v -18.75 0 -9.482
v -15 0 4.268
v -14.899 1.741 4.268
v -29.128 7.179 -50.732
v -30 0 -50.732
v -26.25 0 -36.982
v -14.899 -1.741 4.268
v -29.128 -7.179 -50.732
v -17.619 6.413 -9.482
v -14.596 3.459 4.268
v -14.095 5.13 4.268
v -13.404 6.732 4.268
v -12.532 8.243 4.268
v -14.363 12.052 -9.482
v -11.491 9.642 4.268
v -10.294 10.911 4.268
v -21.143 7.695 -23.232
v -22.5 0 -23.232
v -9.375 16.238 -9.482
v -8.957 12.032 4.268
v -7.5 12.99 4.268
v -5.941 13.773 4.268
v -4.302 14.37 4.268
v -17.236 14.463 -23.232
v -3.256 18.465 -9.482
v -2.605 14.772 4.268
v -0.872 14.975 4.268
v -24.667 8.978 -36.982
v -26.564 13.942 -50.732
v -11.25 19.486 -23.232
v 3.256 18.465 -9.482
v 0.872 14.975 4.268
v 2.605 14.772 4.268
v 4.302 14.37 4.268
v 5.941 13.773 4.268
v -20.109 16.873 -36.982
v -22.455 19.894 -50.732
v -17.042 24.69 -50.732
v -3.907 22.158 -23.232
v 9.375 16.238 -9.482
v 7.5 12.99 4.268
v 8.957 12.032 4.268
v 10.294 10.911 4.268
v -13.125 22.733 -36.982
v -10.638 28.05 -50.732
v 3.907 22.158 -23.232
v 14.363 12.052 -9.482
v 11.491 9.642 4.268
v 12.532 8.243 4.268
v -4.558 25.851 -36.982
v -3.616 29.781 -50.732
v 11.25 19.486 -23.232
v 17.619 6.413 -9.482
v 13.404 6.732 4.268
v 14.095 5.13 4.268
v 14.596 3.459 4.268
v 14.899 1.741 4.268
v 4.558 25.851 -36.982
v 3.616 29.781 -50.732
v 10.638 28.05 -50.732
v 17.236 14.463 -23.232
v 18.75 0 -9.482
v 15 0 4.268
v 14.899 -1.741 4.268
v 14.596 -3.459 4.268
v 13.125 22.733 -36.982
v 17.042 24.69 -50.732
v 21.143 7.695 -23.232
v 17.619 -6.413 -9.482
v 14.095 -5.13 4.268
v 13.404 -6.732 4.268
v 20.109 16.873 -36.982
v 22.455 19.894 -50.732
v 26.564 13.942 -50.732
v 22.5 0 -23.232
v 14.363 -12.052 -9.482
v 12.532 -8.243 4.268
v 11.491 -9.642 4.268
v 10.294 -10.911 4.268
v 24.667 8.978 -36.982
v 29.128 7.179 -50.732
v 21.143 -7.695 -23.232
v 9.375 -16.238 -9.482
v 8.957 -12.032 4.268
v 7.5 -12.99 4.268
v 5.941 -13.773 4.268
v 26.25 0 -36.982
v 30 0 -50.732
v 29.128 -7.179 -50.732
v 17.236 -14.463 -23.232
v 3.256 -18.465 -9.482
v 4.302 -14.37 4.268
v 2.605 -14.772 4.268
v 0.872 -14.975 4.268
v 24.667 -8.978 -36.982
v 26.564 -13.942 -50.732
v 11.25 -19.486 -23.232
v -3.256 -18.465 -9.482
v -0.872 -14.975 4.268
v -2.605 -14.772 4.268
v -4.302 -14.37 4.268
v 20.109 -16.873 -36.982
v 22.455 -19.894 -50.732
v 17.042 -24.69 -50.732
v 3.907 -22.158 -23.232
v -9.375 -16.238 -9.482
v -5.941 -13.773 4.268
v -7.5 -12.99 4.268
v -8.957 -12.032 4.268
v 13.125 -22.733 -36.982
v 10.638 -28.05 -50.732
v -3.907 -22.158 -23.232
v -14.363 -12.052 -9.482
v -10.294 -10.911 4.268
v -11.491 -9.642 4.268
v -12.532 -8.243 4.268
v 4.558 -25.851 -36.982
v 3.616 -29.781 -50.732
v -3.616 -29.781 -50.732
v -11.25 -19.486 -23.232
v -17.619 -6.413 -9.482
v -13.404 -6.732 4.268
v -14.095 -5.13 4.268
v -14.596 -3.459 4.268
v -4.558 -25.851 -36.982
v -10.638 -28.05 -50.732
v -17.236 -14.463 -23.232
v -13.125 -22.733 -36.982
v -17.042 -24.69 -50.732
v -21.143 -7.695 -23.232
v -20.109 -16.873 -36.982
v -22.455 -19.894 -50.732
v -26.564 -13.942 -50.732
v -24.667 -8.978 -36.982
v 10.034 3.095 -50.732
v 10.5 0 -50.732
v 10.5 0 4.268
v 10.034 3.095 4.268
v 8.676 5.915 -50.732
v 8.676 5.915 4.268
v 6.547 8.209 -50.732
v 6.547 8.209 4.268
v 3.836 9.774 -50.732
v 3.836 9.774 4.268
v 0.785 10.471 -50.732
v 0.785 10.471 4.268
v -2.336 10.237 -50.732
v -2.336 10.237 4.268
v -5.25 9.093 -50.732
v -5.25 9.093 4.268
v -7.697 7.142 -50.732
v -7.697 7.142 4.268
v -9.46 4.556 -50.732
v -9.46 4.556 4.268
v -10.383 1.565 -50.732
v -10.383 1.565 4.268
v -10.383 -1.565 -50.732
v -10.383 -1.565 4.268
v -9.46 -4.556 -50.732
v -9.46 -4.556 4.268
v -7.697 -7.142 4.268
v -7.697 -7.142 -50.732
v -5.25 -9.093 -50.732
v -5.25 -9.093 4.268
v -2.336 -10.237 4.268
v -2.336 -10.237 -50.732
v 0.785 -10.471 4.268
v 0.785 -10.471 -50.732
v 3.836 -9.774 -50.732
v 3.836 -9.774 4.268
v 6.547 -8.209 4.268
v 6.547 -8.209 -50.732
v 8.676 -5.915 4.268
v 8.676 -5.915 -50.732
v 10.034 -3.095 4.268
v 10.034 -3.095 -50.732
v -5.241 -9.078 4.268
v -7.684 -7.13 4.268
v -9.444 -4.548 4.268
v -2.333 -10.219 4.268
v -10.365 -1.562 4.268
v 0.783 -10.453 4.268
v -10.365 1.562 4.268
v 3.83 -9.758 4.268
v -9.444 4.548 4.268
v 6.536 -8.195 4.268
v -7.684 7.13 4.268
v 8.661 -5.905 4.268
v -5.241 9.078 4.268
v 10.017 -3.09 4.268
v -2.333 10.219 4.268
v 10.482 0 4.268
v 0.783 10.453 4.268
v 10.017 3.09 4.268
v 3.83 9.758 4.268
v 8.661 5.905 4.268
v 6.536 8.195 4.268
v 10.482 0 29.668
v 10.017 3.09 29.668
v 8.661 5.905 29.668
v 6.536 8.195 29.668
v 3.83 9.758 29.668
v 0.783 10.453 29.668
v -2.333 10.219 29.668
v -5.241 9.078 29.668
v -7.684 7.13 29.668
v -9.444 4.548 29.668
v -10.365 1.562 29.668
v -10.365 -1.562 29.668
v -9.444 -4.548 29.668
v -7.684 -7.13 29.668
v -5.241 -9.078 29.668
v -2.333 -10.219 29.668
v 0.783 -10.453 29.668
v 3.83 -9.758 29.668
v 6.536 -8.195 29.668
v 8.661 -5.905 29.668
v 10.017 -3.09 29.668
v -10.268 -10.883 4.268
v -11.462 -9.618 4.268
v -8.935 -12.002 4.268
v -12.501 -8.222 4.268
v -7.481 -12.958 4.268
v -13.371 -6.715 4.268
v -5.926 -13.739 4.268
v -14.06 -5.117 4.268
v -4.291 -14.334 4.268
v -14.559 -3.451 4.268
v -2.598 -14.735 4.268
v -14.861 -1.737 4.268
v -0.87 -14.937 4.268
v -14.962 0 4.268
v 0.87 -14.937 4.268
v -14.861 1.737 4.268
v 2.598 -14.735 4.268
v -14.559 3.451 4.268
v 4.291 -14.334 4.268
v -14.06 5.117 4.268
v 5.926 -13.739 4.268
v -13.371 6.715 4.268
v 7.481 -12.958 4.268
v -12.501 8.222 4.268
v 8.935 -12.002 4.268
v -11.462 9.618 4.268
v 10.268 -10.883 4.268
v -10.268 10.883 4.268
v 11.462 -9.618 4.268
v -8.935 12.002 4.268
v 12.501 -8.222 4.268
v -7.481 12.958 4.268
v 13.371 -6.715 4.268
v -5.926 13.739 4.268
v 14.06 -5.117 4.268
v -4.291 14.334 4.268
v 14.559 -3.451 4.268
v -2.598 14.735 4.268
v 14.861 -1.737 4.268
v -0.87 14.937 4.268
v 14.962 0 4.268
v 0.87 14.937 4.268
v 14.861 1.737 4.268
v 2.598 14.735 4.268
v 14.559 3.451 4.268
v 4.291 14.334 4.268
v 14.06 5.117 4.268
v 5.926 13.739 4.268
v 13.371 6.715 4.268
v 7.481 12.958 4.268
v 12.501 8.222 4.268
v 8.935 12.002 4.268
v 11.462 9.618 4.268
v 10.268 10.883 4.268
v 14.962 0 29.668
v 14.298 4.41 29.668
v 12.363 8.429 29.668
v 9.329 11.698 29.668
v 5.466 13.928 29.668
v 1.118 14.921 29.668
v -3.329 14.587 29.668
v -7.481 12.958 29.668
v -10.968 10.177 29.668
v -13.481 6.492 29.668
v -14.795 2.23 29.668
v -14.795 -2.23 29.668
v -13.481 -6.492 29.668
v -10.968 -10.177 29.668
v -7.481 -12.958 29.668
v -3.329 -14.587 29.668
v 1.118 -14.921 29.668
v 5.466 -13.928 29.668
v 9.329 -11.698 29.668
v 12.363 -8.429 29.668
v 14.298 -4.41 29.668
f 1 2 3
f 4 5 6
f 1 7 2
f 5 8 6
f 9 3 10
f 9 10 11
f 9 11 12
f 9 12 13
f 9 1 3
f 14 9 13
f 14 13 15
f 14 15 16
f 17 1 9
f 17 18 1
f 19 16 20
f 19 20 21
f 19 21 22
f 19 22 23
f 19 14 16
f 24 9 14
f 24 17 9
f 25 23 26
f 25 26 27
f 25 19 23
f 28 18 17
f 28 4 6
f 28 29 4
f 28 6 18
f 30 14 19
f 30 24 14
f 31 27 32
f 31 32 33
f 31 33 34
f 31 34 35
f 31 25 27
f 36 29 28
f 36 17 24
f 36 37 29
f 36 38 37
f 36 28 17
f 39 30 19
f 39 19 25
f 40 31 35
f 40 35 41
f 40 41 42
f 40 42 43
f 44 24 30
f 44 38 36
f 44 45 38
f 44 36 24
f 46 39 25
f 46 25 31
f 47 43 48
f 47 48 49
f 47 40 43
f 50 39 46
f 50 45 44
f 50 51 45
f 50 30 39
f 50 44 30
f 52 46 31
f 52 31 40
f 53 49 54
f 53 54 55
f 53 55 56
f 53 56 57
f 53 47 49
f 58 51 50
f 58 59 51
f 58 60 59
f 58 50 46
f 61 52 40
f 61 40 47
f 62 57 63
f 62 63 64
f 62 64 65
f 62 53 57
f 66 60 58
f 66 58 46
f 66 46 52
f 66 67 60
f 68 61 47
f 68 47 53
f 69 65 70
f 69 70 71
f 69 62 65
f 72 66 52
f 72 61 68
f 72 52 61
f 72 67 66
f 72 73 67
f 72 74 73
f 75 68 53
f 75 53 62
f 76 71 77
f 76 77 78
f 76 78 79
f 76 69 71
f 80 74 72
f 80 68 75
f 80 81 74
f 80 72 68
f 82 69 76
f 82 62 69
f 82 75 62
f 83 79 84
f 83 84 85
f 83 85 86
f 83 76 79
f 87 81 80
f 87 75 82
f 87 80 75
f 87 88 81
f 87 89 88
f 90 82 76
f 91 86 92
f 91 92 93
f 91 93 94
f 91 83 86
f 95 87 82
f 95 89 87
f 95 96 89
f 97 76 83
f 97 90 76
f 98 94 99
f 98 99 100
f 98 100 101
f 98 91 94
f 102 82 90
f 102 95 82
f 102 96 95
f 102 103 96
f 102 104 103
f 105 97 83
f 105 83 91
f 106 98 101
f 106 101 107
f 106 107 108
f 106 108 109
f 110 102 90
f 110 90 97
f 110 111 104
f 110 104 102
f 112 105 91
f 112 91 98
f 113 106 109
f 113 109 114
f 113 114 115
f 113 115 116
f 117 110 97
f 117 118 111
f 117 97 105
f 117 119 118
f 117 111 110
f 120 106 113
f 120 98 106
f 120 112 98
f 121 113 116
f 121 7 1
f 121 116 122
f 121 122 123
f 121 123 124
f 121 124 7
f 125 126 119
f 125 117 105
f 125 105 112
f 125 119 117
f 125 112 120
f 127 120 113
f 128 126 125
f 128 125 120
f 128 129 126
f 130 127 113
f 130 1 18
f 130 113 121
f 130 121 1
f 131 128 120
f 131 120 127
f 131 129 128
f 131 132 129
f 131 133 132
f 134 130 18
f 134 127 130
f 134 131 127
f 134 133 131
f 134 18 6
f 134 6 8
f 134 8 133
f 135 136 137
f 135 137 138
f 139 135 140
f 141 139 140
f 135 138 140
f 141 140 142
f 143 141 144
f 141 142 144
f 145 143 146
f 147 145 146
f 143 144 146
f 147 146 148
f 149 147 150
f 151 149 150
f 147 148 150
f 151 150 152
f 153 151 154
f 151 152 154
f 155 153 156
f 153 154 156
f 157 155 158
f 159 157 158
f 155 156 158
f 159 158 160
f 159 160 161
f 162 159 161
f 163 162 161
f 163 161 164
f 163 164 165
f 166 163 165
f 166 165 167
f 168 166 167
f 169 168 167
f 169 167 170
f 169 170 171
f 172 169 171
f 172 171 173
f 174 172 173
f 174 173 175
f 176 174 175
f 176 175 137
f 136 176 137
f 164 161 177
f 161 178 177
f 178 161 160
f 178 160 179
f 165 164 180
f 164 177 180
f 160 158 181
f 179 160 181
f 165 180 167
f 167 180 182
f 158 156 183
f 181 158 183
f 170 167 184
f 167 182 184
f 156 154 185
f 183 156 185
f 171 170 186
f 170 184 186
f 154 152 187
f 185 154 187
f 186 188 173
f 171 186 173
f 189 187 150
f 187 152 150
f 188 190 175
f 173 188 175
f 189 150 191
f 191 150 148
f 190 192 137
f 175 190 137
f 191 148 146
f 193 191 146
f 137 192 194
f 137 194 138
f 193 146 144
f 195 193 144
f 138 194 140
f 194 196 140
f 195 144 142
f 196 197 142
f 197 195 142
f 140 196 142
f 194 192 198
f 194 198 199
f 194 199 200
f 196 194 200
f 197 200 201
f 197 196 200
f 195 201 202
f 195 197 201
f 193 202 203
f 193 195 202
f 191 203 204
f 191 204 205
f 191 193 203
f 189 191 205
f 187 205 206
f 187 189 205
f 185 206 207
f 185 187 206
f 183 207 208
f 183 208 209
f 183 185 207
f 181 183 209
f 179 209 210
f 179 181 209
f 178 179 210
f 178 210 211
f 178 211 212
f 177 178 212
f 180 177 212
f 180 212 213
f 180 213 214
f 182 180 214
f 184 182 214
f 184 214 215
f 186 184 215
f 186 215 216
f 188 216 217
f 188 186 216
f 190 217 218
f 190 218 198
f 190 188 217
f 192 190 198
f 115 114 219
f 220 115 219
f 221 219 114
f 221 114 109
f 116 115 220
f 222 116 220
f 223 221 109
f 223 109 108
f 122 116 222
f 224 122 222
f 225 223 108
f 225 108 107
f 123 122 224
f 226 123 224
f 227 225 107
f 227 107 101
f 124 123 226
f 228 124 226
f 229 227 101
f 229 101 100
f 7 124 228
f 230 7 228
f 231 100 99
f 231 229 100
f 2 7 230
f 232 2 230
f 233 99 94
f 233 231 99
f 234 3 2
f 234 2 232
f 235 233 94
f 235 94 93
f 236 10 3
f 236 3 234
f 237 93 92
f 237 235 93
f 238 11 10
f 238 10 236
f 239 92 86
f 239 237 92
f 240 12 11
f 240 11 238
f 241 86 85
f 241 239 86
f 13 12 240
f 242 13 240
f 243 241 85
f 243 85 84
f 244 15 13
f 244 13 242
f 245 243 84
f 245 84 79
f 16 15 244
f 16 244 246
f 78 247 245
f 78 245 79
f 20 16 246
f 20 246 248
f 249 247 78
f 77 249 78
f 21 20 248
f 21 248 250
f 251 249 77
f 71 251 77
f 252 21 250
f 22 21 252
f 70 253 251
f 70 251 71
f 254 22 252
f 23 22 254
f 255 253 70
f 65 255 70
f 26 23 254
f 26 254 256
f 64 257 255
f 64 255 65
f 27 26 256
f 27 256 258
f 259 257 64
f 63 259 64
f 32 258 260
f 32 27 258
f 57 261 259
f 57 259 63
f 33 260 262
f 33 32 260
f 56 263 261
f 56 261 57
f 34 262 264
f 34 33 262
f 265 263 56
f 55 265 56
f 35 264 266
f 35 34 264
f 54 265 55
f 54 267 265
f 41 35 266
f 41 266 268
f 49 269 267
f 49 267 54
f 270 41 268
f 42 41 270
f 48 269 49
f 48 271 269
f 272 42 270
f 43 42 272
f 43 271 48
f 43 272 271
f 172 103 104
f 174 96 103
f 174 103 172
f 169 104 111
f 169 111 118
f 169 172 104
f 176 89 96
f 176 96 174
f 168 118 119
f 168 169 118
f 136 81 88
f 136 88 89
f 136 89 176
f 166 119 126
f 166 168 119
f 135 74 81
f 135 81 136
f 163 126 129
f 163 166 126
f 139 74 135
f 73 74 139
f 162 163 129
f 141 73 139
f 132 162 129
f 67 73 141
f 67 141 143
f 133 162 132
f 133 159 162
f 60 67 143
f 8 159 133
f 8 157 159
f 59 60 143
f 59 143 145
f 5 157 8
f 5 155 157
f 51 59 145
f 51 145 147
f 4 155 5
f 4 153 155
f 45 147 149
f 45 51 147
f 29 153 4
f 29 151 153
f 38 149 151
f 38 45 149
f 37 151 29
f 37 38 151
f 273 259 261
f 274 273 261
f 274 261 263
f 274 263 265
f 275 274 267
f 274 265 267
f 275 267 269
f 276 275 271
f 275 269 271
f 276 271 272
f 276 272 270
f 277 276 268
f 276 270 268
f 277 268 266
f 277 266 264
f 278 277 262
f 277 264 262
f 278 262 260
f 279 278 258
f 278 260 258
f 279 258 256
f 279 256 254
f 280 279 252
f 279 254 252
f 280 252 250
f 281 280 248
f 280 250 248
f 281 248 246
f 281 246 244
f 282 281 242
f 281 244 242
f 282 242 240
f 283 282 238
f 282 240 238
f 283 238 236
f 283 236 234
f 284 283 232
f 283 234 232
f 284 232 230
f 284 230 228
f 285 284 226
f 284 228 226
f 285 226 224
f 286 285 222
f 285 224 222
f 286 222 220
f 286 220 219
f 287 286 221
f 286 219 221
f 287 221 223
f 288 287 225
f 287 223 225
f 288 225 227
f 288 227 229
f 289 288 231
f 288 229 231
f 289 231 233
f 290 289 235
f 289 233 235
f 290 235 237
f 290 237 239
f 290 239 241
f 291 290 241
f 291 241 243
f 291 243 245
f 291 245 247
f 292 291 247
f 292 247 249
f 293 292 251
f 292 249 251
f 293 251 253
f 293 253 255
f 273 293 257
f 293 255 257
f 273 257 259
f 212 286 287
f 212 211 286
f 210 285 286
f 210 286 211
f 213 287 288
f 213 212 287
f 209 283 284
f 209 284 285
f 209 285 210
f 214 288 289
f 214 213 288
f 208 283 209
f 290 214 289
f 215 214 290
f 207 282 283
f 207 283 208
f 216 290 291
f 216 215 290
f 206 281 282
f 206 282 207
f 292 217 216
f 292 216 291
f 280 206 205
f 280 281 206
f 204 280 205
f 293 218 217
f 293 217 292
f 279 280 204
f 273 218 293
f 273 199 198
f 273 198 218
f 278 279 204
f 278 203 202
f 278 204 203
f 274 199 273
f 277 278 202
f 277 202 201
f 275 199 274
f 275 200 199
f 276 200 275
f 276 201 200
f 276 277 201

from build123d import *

# Parameters (mm, degrees)
F2_R     = 10.5
F3_DEPTH = 90.17
F4_R     = 14.962462
F4_R_2   = 10.482231
F5_DEPTH = 25.4


with BuildPart() as f1:
    # F0 (on Front) → F1 (revolve)
    with BuildSketch(Plane.XZ):
        Polygon((0, -50.732268), (0, 4.267732), (-15, 4.267732), (-30, -50.732268), align=None)
    revolve(axis=Axis((0, 0, -23.232268), (0, 0, -1)))

    # F2 (on face) → F3 (cut)
    with BuildSketch(Plane.XY.offset(4.267732)):
        Circle(F2_R)
    extrude(amount=-F3_DEPTH, mode=Mode.SUBTRACT)

    # F4 (on face) → F5 (join)
    with BuildSketch(Plane.XY.offset(4.267732)):
        Circle(F4_R)
        Circle(F4_R_2, mode=Mode.SUBTRACT)
    extrude(amount=F5_DEPTH)


solid = f1.part
